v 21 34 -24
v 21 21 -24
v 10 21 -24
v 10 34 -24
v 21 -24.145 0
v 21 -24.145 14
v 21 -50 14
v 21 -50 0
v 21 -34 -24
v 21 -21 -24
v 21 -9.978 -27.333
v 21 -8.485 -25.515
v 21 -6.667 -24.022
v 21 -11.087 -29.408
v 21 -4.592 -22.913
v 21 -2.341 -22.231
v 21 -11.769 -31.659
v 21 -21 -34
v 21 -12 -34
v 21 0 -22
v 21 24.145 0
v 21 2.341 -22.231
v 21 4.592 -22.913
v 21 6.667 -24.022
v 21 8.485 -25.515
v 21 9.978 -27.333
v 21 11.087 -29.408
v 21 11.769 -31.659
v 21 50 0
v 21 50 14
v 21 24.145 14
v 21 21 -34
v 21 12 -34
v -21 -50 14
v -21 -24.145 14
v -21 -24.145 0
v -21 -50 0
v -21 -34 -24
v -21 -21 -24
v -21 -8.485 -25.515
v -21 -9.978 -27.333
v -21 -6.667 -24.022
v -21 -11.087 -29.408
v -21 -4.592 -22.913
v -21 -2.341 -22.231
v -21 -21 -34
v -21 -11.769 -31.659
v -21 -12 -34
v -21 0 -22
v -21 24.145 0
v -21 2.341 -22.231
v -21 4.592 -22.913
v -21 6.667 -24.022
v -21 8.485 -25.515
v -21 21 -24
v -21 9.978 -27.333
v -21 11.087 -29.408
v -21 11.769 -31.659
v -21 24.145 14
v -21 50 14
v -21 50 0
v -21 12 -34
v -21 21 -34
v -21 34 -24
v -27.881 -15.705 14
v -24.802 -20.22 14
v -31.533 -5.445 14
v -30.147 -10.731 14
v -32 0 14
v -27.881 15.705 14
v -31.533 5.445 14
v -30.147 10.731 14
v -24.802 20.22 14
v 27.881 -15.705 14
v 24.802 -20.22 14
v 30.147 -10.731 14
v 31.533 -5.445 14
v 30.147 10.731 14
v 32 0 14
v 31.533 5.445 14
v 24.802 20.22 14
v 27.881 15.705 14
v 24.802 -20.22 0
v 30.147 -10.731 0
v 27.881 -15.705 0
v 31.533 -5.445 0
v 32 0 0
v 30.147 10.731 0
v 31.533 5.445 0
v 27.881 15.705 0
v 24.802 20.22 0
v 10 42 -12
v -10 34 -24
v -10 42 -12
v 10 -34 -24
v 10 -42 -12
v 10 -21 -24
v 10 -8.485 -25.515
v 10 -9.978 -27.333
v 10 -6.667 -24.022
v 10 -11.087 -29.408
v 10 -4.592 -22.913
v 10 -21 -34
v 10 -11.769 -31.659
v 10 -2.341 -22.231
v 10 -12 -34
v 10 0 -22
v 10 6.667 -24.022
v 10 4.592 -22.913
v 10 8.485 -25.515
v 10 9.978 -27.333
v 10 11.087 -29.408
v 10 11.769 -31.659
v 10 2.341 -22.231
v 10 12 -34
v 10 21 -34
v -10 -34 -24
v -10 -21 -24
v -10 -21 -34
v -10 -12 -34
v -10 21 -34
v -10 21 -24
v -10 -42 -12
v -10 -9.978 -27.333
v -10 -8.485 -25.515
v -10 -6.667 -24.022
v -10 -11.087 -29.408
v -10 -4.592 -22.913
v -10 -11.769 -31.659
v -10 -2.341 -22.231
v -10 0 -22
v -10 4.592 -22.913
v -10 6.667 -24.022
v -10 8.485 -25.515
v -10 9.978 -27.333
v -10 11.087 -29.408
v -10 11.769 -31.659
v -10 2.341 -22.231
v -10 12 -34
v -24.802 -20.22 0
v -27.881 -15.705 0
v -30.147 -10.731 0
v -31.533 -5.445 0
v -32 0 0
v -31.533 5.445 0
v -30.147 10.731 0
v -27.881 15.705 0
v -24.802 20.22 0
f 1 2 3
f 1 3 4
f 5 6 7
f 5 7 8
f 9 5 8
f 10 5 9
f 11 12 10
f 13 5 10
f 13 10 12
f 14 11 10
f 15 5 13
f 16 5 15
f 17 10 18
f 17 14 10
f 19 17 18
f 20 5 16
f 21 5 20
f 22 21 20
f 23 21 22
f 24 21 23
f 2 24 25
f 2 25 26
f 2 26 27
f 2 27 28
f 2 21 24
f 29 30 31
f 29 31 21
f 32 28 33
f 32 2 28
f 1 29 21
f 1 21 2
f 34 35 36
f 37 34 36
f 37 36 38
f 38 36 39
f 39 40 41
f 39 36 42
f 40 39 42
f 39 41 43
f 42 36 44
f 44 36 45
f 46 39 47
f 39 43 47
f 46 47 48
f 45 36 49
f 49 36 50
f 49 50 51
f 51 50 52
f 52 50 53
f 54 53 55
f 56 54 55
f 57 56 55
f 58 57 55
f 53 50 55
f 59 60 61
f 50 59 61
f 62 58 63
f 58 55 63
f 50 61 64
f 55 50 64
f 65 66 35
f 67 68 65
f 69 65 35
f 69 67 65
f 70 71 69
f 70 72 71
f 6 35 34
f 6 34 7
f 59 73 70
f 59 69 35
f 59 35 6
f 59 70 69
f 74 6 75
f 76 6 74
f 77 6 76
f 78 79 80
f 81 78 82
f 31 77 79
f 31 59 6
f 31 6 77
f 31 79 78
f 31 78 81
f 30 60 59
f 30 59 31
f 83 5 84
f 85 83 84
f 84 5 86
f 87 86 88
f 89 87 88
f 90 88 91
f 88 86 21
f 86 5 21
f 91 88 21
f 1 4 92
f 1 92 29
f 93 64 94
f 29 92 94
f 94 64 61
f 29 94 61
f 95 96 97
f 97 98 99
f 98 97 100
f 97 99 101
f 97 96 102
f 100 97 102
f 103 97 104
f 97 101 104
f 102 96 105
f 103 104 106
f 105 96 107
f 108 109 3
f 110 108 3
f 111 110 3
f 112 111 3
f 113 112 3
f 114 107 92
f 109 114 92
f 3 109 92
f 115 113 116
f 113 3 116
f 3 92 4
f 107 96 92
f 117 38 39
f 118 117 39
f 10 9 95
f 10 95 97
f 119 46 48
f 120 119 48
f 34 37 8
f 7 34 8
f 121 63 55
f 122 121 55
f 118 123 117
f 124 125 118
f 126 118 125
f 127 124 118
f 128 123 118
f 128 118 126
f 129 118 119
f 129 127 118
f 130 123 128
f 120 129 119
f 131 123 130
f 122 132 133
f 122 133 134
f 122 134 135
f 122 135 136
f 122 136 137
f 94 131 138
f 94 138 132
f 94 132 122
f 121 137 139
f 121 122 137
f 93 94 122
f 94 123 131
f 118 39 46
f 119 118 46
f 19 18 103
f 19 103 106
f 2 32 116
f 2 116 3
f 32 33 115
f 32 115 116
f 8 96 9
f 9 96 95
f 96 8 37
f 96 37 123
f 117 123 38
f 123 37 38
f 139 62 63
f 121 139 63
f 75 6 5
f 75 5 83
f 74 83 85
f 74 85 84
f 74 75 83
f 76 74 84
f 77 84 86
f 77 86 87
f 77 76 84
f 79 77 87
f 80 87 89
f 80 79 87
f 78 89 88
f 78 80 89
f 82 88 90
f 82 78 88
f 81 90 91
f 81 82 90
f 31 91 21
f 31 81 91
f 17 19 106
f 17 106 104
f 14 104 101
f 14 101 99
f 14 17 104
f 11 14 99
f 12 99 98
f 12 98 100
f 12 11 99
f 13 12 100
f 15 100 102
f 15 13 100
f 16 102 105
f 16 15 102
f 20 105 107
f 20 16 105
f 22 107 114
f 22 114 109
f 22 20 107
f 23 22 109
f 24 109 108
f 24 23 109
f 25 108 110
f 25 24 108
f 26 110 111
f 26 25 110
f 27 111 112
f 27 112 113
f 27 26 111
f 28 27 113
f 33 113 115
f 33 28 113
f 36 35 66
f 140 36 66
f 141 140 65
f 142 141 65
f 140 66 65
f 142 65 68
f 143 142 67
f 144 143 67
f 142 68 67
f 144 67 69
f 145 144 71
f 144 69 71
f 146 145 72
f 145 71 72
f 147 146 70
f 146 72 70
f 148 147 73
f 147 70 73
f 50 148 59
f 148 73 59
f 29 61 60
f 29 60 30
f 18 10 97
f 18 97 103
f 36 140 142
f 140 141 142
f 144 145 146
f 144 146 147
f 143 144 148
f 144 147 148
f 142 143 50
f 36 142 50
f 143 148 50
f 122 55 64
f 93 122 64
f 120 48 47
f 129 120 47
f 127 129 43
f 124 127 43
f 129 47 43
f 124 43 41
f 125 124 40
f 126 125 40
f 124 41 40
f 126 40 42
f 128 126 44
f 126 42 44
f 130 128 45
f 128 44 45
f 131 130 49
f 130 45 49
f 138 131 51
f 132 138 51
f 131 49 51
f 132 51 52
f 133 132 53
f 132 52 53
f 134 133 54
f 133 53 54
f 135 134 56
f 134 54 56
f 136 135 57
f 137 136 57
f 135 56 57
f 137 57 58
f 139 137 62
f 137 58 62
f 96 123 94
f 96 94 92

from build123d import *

# Parameters (mm, degrees)
SKETCH1_W           = 42
SKETCH1_H           = 100
BOSS_EXTRUDE2_DEPTH = 14
BOSS_EXTRUDE3_DEPTH = 14
BOSS_EXTRUDE4_DEPTH = 11
SKETCH11_W          = 20
SKETCH11_H          = 12
BOSS_EXTRUDE5_DEPTH = 100
CUT_EXTRUDE1_DEPTH  = 74.620649277


with BuildPart() as part:
    # Sketch1 → Boss-Extrude2 (new body)
    with BuildSketch(Plane.XY):
        Rectangle(SKETCH1_W, SKETCH1_H)
    extrude(amount=BOSS_EXTRUDE2_DEPTH)

    # Sketch3 → Boss-Extrude3 (add)
    with BuildSketch(Plane.XY.offset(14)):
        with BuildLine():
            Line((-21, 24.145392935), (-21, -24.145392935))
            ThreePointArc((-21, -24.145392935), (-32, 0), (-21, 24.145392935))
        make_face()
        with BuildLine():
            Line((21, 24.145392935), (21, -24.145392935))
            ThreePointArc((21, -24.145392935), (32, 0), (21, 24.145392935))
        make_face()
    extrude(amount=-BOSS_EXTRUDE3_DEPTH)

    # Sketch4 → Boss-Extrude4 (add)
    with BuildSketch(Plane(origin=(21, 0, 0), x_dir=(0, 0, -1), z_dir=(1, 0, 0))):
        with BuildLine():
            Line((34, 12), (34, 21))
            Line((34, 21), (24, 21))
            Line((24, 21), (24, 34))
            Line((24, 34), (0, 50))
            Line((0, 50), (0, -50))
            Line((0, -50), (24, -34))
            Line((24, -34), (24, -21))
            Line((24, -21), (34, -21))
            Line((34, -21), (34, -12))
            ThreePointArc((34, -12), (22, 0), (34, 12))
        make_face()
    boss_extrude4 = extrude(amount=-BOSS_EXTRUDE4_DEPTH)

    # Mirror1: Boss-Extrude4 across plane
    add(boss_extrude4.mirror(Plane(origin=(0, 0, 0), x_dir=(0, 0, 1), z_dir=(1, 0, 0))))

    # Sketch11 → Boss-Extrude5 (add, through all)
    with BuildSketch(Plane(origin=(0, 50, 0), x_dir=(1, 0, 0), z_dir=(0, 1, 0))):
        with Locations((0, 6)):
            Rectangle(SKETCH11_W, SKETCH11_H)
    extrude(amount=-BOSS_EXTRUDE5_DEPTH)

    # Sketch12 → Cut-Extrude1 (cut, through all)
    with BuildSketch(Plane(origin=(10, 0, 0), x_dir=(0, 0, -1), z_dir=(1, 0, 0))):
        Polygon((0, 50), (12, 42), (12, 50), align=None)
    cut_extrude1 = extrude(amount=-CUT_EXTRUDE1_DEPTH, mode=Mode.SUBTRACT)

    # Mirror2: Cut-Extrude1 across plane
    add(cut_extrude1.mirror(Plane.ZX), mode=Mode.SUBTRACT)


solid = part.part
